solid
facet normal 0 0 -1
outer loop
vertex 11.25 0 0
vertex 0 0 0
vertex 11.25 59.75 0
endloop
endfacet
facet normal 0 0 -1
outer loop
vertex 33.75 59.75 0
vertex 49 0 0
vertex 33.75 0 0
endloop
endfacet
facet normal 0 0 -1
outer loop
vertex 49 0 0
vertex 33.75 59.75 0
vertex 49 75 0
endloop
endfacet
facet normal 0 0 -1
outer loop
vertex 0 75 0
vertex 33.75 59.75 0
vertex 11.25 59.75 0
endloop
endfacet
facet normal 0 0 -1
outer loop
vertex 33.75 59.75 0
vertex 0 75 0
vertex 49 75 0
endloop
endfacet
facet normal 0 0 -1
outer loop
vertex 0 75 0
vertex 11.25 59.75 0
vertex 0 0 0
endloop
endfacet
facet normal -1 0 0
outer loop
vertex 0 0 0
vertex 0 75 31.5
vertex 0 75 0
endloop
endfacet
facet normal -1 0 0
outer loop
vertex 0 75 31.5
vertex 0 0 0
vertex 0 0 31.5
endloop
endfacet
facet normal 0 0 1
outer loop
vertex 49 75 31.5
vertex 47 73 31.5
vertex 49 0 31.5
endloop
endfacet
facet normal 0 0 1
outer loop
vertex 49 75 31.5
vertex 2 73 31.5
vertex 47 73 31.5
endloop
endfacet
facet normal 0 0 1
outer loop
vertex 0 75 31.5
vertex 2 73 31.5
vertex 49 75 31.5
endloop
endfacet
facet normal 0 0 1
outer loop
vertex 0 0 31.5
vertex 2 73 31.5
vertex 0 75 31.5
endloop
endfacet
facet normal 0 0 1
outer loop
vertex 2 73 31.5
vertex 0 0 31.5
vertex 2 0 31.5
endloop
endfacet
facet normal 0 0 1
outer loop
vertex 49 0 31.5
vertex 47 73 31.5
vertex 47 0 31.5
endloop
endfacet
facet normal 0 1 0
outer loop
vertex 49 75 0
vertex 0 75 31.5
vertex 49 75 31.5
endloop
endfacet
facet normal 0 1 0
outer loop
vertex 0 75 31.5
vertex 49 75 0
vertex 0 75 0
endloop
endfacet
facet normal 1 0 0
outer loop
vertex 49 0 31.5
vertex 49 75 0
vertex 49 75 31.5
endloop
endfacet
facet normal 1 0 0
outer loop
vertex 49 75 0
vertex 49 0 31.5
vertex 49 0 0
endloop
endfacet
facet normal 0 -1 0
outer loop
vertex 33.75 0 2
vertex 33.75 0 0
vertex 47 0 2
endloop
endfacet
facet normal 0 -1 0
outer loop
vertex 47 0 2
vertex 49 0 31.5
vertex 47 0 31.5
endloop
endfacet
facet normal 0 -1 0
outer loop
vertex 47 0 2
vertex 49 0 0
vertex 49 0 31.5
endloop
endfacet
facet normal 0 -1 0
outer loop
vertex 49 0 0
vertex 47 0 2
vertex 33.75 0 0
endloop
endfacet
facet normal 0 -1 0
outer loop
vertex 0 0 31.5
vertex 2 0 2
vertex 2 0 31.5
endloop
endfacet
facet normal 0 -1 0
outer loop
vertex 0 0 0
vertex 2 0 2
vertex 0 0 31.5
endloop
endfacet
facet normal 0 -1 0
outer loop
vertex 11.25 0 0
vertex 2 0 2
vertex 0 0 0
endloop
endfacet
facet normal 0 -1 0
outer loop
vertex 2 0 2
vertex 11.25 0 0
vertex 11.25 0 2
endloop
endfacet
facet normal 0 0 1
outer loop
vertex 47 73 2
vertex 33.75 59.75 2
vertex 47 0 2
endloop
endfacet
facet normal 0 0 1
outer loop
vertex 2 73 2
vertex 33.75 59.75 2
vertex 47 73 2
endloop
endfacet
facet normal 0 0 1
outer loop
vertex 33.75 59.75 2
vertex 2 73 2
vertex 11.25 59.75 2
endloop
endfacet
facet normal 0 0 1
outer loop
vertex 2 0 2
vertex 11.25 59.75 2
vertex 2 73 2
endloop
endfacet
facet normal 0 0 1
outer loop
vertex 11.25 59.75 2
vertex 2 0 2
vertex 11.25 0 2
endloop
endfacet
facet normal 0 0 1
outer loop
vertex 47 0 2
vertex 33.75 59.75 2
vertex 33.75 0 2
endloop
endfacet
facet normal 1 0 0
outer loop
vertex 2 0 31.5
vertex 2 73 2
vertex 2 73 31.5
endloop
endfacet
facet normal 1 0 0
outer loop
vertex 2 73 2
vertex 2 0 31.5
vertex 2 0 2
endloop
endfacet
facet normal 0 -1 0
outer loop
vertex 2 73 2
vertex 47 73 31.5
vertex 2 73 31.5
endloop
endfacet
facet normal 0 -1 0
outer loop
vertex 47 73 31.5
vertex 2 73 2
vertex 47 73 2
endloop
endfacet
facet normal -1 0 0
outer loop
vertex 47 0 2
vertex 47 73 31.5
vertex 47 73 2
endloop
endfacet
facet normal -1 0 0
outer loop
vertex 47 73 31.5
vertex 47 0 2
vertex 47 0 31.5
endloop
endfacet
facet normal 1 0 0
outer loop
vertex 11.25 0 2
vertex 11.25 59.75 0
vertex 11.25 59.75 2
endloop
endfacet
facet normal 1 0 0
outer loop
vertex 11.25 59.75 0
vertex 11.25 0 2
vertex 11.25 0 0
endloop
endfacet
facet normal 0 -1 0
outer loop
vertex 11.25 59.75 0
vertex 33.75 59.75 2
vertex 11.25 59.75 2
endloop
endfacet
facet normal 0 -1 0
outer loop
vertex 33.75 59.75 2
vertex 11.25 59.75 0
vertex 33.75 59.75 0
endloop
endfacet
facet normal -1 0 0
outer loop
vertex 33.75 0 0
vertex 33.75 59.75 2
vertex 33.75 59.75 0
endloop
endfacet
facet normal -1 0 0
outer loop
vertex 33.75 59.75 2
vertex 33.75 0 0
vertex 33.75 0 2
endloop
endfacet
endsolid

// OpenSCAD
cardBoxSlotWidth = 45;
cardBoxSlotHeight = 71;
cardBoxSlot = [cardBoxSlotWidth, cardBoxSlotHeight];

wallOffset = 4;

cardBoxWidth = cardBoxSlotWidth + wallOffset;
cardBoxHeight = cardBoxSlotHeight + wallOffset;
cardBox = [cardBoxWidth, cardBoxHeight];

cardBoxZRatio = 2;
cardBoxZ = (67 - wallOffset) / cardBoxZRatio;

difference() {
  linear_extrude(cardBoxZ)
    square(size=cardBox);

  translate(v=[wallOffset / 2, wallOffset / 2, wallOffset / 2])
    linear_extrude(cardBoxZ)
      square(size=cardBoxSlot);

  translate(v=[wallOffset / 2, -wallOffset, wallOffset / 2])
    linear_extrude(cardBoxZ)
      square(size=cardBoxSlot);
  translate(v=[cardBoxSlotWidth / 4, -wallOffset, -wallOffset])
    linear_extrude(cardBoxZ * 2)
      square(
        size=[
          cardBoxSlotWidth / 2,
          cardBoxSlotHeight - cardBoxSlotWidth / 4 + wallOffset,
        ]
      );
}
